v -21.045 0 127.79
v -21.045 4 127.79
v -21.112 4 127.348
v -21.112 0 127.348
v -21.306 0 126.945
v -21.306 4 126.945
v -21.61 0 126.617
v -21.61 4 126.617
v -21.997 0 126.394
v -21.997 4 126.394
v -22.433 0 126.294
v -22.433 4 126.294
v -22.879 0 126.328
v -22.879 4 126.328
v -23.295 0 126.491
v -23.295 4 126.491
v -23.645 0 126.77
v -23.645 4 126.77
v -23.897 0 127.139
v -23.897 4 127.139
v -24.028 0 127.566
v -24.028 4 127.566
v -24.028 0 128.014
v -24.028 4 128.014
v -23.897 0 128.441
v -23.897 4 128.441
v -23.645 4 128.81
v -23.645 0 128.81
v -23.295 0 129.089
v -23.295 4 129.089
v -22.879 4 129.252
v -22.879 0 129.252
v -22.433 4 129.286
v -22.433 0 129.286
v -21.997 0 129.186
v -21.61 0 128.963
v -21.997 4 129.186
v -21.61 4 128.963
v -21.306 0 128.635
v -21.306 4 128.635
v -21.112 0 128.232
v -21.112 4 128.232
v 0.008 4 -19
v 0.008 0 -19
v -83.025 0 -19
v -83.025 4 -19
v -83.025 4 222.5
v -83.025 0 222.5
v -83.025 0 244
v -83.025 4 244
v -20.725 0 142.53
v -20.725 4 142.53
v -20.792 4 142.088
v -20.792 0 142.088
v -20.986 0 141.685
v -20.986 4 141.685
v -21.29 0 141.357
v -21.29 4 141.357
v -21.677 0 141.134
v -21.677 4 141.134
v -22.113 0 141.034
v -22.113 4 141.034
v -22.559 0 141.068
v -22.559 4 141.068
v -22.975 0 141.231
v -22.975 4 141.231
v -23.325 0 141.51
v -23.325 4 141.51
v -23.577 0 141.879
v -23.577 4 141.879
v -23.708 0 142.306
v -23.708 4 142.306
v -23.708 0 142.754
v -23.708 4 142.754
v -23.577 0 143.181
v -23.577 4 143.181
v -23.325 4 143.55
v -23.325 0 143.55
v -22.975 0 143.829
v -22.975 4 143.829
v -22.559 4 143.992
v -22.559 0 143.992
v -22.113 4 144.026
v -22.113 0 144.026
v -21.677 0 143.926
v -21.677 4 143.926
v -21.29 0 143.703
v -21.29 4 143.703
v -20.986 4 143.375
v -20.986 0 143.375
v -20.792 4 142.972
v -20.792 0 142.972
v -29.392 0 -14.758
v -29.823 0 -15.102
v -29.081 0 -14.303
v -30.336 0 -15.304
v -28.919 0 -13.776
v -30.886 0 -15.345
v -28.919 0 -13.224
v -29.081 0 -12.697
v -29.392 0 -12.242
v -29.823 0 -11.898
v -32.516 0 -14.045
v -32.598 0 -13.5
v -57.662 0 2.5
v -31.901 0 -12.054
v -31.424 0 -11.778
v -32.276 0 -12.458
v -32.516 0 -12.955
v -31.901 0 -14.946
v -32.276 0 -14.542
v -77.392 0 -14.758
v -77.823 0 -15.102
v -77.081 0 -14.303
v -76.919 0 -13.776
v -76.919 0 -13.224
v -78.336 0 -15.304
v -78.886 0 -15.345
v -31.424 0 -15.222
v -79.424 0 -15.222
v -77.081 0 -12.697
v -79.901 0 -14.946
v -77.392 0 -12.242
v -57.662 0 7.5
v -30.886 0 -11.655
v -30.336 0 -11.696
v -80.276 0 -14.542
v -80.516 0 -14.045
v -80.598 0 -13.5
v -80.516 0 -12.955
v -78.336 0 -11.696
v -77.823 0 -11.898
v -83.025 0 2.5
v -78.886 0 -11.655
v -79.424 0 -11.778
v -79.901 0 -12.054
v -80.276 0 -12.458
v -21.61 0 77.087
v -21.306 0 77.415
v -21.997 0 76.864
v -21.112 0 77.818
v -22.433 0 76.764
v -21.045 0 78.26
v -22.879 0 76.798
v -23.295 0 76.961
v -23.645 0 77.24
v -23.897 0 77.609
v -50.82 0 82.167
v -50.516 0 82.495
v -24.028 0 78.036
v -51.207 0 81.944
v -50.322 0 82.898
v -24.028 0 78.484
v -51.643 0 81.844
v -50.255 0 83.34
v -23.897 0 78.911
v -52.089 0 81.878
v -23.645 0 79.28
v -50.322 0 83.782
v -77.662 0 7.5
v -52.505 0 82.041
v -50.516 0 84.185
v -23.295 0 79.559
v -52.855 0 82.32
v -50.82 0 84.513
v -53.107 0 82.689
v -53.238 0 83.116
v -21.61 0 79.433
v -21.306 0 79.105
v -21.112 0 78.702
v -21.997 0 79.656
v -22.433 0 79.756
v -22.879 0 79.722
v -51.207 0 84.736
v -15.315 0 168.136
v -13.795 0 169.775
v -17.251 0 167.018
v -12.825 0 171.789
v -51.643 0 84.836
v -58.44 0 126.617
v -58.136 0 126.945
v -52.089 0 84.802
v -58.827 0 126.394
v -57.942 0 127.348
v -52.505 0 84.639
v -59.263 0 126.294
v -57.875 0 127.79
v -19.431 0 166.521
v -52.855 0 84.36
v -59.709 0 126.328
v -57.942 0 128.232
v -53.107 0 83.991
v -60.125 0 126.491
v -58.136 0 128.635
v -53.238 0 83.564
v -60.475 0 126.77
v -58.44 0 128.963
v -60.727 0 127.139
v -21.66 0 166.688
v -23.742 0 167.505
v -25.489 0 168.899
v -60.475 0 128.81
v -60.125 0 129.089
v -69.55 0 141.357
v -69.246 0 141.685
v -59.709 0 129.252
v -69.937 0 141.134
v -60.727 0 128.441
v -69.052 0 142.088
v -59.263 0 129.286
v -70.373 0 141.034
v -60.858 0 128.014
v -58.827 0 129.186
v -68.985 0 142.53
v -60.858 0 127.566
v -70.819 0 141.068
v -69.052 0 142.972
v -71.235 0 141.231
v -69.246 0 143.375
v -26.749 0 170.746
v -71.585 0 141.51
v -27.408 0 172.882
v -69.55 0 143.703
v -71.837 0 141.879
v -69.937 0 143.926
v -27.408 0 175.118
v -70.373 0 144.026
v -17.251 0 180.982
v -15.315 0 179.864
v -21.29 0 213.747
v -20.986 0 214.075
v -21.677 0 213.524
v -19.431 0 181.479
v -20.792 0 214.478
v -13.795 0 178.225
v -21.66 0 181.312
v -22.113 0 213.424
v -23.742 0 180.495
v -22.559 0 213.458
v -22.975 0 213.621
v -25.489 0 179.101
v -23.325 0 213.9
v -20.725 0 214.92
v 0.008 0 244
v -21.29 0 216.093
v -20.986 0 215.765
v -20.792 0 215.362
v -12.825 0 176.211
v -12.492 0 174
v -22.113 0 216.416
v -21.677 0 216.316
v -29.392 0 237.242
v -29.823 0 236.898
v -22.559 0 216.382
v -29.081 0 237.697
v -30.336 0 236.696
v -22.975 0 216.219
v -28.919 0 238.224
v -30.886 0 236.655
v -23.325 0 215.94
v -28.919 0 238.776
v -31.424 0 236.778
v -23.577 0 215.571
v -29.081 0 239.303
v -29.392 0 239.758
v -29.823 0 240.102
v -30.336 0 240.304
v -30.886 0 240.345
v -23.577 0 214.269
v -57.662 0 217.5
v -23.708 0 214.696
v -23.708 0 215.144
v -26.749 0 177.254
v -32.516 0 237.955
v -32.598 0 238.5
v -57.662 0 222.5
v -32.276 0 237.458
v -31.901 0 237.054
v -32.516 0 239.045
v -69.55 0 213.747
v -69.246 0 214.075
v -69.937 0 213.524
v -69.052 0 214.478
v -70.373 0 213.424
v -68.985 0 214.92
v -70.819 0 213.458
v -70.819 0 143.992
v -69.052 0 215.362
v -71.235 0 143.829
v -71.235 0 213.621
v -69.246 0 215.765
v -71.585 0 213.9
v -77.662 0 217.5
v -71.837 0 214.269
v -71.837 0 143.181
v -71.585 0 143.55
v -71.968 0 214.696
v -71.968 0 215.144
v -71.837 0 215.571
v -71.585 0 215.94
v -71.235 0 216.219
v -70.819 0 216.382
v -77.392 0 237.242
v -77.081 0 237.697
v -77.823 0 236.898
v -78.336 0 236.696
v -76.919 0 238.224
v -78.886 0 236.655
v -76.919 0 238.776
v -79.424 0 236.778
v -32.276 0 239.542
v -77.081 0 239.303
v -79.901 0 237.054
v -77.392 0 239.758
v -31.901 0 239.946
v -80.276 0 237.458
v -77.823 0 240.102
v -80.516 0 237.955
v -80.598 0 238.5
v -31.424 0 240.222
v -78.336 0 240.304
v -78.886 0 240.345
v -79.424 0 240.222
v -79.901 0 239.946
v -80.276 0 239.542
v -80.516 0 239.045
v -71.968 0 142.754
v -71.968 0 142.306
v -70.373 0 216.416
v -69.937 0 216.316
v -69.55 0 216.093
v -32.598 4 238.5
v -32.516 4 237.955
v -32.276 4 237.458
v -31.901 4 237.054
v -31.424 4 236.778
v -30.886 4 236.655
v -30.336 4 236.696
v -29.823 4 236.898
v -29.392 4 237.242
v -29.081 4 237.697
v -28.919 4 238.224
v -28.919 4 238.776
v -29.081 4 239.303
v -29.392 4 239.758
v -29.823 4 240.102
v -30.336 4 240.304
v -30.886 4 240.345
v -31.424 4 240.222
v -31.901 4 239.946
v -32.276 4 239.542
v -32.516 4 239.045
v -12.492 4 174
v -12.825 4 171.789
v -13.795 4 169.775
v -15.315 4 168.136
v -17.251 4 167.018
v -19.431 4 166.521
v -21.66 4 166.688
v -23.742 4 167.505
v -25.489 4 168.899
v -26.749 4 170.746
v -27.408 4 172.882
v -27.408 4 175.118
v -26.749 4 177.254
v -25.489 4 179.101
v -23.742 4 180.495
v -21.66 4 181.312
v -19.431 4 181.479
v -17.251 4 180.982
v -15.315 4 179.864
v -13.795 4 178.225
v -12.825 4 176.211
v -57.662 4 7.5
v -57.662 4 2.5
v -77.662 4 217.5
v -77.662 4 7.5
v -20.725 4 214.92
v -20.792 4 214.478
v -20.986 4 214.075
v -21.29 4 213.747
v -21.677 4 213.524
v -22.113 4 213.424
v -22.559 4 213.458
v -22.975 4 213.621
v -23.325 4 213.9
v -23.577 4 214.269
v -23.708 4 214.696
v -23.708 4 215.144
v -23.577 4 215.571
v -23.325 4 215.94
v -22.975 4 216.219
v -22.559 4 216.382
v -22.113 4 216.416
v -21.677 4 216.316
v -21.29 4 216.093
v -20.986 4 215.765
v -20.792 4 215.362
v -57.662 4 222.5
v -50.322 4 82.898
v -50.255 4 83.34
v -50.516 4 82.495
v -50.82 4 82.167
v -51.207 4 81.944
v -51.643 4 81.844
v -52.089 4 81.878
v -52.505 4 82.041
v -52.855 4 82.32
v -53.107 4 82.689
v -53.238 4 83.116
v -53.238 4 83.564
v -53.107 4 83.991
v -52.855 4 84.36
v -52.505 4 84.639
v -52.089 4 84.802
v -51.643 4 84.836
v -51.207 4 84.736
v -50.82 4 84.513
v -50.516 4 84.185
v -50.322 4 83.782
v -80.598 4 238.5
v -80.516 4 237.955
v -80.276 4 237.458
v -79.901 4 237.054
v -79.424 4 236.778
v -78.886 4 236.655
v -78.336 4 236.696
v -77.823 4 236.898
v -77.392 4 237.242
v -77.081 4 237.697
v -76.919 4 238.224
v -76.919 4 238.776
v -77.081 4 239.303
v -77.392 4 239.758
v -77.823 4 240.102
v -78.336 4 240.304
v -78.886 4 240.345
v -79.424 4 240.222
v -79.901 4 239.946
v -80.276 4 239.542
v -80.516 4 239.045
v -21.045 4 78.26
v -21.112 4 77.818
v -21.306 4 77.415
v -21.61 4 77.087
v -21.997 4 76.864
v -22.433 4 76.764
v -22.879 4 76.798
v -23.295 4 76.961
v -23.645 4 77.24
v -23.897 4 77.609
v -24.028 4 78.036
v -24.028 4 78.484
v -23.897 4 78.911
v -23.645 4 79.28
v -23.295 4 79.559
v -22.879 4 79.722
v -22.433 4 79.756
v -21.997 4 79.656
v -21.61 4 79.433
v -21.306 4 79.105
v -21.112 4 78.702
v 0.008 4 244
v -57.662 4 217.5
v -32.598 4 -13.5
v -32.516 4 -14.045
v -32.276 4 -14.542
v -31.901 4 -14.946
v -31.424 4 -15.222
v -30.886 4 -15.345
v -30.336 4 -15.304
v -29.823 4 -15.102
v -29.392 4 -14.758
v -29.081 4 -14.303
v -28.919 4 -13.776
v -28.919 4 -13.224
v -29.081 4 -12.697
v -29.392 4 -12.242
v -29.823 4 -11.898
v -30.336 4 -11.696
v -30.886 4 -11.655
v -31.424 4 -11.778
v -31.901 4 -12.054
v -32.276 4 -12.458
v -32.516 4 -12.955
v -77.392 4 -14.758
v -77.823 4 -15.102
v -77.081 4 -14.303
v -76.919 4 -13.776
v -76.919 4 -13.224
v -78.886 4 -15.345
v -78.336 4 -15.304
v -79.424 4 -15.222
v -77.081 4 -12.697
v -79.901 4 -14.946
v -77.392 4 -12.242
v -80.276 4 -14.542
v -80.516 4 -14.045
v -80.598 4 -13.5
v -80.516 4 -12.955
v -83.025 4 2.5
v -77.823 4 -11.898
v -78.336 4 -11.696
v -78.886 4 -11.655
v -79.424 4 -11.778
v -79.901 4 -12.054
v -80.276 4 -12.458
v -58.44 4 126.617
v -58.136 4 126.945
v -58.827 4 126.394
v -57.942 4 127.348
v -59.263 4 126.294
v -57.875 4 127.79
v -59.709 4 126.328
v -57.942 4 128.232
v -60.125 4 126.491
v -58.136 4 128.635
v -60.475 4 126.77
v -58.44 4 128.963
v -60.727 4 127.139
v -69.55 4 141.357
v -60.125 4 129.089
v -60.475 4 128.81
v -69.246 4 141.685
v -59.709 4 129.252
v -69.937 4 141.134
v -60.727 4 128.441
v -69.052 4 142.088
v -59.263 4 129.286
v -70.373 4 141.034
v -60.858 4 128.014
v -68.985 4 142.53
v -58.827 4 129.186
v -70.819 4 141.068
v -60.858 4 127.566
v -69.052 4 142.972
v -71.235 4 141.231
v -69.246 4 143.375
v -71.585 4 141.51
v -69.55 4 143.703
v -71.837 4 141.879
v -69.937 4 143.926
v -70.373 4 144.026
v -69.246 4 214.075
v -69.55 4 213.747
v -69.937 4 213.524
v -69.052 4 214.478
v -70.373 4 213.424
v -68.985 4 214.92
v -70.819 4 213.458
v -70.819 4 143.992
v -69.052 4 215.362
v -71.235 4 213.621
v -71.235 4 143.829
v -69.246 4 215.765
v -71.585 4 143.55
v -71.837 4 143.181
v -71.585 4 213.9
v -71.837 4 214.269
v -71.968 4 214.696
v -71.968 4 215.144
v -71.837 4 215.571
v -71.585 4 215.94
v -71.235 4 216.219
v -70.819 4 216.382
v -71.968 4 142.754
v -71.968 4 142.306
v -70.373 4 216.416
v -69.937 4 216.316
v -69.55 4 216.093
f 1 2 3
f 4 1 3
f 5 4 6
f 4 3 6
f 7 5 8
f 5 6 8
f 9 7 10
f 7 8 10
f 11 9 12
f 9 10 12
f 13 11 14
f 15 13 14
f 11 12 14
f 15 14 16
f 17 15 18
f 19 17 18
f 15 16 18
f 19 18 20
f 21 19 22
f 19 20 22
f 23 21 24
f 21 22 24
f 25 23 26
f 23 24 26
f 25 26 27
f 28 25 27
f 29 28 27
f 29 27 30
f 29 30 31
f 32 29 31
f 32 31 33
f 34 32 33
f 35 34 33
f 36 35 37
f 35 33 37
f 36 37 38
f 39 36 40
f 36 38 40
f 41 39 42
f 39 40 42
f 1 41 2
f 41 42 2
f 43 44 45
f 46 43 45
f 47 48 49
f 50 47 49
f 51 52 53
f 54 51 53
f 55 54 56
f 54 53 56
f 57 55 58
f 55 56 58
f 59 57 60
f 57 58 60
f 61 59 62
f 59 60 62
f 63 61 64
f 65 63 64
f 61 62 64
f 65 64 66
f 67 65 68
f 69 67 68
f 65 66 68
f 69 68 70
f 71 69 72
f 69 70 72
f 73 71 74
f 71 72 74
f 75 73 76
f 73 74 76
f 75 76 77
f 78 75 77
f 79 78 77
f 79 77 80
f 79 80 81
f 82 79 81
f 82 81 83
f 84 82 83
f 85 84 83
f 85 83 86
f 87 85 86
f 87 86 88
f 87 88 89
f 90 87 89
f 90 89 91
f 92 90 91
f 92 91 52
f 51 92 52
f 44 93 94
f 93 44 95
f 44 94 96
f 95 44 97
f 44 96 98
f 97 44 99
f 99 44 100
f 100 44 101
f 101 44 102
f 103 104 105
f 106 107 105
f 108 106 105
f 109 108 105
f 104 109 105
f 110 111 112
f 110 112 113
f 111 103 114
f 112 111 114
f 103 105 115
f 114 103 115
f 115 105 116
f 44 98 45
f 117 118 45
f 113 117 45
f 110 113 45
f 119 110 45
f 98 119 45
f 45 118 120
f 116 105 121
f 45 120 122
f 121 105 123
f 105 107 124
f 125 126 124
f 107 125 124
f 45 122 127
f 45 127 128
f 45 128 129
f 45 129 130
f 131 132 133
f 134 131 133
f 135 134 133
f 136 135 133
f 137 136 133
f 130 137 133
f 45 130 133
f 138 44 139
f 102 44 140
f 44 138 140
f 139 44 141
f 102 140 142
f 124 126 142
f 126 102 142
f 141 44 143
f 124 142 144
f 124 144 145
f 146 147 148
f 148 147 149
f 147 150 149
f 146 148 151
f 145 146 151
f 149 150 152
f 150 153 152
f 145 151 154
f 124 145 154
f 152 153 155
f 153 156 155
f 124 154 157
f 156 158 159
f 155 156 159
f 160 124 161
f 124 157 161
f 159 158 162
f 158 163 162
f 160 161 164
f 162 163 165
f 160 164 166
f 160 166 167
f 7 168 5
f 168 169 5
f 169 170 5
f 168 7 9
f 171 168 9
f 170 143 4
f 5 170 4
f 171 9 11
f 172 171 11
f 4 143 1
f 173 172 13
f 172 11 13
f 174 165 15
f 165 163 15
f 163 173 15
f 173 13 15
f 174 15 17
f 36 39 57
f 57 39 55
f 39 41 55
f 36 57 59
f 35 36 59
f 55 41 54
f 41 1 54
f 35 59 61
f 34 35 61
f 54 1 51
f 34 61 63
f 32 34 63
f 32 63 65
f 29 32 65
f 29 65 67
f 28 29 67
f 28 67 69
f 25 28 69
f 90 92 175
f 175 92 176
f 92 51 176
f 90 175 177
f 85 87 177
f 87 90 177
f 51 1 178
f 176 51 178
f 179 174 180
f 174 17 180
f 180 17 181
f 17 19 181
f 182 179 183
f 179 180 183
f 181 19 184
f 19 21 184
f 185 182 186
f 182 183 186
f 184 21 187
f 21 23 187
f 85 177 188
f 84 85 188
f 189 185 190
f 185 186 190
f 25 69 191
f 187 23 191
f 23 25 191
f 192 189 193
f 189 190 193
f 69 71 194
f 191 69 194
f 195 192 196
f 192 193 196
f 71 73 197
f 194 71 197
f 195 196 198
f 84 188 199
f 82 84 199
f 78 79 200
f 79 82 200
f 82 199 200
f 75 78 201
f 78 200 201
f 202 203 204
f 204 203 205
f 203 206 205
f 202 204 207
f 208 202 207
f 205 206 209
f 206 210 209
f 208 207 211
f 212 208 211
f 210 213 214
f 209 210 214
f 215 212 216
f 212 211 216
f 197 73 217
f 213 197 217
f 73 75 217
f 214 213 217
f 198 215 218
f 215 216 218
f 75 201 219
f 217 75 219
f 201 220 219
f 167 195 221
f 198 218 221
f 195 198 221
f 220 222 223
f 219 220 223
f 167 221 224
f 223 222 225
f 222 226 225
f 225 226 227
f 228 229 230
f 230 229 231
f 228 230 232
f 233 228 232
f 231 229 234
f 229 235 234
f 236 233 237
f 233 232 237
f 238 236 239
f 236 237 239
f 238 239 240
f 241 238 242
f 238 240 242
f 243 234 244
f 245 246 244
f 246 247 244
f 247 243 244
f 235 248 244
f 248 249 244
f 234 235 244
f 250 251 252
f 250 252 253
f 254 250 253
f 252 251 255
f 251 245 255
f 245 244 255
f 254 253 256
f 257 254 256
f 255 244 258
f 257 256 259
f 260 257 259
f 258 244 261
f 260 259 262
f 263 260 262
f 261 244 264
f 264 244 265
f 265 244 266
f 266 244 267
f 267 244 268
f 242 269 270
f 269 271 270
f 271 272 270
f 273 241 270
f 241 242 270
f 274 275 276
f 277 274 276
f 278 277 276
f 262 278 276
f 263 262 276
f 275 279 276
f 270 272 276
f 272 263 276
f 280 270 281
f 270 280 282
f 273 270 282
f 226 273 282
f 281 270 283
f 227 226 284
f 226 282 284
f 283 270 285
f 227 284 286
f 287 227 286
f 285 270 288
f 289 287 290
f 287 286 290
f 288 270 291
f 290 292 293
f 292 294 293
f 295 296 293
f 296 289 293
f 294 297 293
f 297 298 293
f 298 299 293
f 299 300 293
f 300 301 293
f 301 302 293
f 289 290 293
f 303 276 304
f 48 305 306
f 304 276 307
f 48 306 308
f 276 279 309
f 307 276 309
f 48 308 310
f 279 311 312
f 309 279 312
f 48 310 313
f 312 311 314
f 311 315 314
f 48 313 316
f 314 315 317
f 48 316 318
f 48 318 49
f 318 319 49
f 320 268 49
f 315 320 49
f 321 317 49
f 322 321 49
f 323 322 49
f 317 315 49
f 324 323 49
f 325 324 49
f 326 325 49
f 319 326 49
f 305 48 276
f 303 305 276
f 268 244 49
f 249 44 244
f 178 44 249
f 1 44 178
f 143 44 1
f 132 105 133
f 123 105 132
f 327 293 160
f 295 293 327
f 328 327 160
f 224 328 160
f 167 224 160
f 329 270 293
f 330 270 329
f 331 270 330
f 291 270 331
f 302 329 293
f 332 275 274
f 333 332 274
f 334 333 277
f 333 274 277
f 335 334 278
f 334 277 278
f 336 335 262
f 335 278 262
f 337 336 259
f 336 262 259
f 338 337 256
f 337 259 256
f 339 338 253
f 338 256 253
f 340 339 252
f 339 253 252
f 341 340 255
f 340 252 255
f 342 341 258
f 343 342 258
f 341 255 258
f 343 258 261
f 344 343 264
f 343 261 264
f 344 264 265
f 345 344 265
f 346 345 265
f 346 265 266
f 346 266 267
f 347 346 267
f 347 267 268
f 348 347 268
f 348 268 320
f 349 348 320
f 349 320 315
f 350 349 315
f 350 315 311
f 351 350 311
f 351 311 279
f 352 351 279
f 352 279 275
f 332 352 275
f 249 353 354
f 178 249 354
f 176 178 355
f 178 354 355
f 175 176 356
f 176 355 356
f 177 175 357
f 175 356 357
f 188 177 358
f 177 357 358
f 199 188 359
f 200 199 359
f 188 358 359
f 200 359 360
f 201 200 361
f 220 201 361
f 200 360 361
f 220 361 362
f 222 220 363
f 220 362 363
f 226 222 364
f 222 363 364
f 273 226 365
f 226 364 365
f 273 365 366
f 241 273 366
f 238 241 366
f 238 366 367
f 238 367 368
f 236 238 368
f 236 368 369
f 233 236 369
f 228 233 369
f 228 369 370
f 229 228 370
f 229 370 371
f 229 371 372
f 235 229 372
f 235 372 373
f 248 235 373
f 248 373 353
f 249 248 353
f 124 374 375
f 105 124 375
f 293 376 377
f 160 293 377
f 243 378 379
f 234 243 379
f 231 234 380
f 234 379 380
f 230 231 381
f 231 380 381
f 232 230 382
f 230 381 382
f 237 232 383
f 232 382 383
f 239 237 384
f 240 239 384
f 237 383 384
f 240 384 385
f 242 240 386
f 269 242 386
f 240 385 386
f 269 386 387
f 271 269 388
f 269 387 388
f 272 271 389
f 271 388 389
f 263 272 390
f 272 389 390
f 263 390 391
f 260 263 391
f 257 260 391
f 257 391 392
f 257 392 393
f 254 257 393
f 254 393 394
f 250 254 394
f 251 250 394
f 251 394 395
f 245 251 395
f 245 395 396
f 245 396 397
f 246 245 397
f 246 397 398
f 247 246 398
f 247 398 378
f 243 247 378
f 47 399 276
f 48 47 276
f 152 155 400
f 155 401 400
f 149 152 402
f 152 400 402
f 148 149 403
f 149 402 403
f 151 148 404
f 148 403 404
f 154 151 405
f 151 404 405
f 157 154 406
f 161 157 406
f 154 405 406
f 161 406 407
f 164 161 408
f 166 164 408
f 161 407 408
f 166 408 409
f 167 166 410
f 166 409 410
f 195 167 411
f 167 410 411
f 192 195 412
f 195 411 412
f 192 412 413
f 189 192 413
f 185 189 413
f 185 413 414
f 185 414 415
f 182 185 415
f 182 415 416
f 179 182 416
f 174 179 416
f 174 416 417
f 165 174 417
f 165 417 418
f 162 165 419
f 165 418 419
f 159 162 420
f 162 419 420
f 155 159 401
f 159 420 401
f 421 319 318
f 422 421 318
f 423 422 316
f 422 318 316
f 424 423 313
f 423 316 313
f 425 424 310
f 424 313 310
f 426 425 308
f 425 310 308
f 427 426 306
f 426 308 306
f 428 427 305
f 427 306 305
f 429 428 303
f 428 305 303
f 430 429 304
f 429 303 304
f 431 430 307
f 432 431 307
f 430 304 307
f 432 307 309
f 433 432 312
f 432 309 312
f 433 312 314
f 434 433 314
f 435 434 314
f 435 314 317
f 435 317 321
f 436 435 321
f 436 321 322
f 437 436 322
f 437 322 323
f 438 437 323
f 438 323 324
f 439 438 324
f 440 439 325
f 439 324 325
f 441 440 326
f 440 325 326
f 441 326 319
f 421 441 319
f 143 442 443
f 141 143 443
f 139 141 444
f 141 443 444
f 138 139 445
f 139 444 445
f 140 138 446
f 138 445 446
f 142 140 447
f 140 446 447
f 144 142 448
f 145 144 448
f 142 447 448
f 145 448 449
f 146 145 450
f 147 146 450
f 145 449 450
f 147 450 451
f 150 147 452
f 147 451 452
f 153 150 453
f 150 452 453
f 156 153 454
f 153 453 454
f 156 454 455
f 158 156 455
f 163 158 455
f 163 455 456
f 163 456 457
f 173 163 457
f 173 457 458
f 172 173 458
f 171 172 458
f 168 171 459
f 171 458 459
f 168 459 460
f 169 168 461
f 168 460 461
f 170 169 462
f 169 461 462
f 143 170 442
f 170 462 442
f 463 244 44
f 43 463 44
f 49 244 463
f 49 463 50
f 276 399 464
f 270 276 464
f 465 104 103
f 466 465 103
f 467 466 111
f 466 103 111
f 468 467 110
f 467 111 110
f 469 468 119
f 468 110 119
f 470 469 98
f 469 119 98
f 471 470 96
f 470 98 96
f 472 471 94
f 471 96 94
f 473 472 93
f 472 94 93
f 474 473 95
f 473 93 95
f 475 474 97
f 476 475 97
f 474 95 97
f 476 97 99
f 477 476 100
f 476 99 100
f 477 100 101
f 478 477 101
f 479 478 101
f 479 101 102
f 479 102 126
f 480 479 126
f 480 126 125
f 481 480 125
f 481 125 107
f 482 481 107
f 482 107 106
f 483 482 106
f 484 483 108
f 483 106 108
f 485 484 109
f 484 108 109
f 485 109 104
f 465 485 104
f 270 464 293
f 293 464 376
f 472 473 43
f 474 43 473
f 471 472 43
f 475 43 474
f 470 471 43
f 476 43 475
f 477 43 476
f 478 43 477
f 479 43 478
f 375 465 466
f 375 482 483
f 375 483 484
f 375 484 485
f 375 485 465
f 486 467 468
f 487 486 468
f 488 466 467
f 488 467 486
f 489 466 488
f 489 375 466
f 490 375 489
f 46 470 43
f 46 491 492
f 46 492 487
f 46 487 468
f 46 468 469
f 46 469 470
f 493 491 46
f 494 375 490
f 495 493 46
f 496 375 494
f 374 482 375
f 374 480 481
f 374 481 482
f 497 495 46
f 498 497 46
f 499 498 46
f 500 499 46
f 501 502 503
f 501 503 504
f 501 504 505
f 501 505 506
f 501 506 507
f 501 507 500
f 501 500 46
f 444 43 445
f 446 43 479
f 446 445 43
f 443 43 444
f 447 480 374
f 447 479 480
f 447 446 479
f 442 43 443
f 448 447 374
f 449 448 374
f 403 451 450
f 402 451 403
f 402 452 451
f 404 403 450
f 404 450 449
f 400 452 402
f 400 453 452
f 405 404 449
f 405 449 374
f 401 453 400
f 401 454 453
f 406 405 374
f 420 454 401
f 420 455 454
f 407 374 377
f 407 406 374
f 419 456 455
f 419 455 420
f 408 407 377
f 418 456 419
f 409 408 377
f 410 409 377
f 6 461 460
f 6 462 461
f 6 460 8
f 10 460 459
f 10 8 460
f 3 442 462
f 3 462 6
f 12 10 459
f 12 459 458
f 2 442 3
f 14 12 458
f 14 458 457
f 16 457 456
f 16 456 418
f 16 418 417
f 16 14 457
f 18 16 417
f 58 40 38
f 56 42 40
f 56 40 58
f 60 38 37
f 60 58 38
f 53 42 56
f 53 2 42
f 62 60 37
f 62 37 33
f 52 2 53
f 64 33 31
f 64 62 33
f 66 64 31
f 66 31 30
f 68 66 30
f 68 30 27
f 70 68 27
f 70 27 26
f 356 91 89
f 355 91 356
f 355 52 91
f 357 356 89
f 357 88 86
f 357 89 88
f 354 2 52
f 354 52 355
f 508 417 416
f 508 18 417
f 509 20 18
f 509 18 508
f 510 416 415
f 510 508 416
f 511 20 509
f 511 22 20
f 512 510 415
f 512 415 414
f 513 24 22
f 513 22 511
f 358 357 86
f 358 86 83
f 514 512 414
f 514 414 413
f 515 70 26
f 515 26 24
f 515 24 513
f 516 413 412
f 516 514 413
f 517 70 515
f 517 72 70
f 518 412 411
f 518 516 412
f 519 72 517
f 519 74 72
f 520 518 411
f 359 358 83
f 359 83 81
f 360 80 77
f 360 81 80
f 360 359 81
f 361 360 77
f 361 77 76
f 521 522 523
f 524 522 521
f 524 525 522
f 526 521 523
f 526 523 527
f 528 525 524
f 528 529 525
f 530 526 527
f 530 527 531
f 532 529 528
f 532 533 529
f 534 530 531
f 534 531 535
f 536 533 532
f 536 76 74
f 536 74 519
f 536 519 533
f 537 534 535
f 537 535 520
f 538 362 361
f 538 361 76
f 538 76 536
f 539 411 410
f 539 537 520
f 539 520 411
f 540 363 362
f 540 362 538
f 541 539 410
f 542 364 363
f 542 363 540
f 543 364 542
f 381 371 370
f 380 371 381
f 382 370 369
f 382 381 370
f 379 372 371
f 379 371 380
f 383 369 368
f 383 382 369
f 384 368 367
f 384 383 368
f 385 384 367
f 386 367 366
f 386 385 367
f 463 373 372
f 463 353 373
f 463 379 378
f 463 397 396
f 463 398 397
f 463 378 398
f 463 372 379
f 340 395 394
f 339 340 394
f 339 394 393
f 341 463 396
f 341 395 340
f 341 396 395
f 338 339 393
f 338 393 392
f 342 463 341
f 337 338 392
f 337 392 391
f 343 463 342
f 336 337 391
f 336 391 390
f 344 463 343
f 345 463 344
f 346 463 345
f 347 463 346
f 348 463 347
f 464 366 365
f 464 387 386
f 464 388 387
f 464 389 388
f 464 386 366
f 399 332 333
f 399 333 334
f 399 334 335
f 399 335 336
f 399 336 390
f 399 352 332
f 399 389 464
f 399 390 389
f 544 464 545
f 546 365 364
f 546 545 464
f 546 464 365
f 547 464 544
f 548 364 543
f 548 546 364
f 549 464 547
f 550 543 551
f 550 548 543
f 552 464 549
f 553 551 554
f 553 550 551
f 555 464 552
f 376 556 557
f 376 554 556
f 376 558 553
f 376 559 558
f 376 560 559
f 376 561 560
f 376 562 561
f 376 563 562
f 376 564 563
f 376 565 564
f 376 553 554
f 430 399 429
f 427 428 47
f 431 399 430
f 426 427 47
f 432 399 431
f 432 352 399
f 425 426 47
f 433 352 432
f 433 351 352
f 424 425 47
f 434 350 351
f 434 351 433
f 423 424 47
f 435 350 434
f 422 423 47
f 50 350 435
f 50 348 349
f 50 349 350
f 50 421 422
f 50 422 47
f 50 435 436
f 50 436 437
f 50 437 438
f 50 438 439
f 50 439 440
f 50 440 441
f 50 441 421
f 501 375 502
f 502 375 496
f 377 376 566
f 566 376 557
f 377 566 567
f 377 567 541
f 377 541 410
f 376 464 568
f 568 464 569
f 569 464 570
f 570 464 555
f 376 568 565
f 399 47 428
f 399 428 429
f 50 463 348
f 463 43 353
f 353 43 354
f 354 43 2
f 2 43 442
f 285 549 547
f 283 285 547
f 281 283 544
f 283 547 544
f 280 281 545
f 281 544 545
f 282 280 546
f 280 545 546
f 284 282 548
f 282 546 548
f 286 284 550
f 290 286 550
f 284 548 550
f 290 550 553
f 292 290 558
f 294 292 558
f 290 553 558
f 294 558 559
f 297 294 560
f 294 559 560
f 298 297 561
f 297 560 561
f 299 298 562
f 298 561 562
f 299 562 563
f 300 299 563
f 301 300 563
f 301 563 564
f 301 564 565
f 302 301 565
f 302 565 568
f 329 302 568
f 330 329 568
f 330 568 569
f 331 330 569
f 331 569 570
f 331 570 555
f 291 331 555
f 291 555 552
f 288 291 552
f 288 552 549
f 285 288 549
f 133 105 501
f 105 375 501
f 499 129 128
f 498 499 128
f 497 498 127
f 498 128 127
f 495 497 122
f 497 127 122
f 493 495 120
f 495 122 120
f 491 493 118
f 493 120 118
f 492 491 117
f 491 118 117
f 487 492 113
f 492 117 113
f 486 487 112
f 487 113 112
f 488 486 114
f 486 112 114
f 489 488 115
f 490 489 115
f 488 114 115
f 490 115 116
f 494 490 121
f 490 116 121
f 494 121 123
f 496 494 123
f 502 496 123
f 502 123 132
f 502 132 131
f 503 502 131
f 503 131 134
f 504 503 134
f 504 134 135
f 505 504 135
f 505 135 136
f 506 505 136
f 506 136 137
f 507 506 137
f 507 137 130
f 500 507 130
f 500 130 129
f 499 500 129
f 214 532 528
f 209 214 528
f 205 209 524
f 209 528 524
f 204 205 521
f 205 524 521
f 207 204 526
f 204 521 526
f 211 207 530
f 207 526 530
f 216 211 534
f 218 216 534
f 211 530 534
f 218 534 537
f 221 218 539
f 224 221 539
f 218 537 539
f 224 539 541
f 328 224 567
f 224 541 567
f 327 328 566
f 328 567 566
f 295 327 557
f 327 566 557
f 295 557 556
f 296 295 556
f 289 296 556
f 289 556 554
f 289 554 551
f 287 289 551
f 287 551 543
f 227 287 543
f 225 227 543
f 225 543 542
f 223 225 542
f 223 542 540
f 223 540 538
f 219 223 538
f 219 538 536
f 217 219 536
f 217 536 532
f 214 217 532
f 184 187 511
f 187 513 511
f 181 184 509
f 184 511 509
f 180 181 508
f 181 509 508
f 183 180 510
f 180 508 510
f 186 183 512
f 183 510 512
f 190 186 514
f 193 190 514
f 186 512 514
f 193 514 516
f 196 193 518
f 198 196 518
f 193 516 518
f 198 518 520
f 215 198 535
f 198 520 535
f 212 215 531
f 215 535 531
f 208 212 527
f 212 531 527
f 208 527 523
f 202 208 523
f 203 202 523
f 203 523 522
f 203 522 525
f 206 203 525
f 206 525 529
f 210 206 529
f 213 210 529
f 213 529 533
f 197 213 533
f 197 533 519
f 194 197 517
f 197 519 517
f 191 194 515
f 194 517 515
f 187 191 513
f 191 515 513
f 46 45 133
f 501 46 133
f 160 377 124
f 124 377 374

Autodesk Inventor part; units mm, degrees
ref_plane "YZ Plane" through (0, 0, 0) normal (1, 0, 0) x (0, 1, 0)
ref_plane "XZ Plane" through (0, 0, 0) normal (0, 1, 0) x (-1, 0, 0)
ref_plane "XY Plane" through (0, 0, 0) normal (0, 0, 1) x (1, 0, 0)
sketch "Эскиз1" plane through (0, 0, 0) normal (0, 1, 0) x (-1, 0, 0)
  line L0 (-2.6795, -19) -> (83.0251, -19)
  line L1 (-2.6795, 244) -> (83.0251, 244)
  circle A0 centre (30.7479, 238.5) radius 1.85
  circle A1 centre (78.7479, 238.5) radius 1.85
  circle A2 centre (78.7479, -13.5) radius 1.85
  circle A3 centre (30.7479, -13.5) radius 1.85
  line L2 (83.0251, 244) -> (-2.6795, 244)
  line L3 (-2.6795, 244) -> (-2.6795, -19)
  line L4 (-2.6795, -19) -> (83.0251, -19)
  line L5 (83.0251, -19) -> (83.0251, 244)
  point P0 (0, 0)
  point P1 (83.0251, -19)
  point P2 (-2.6795, 244)
  dimension "d7" = 5.5
  dimension "d8" = 5.5
  dimension "d9" = 4.2772
  dimension "d10" = 48
  dimension "d11" = 263
  dimension "d12" = 5.5
  dimension "d13" = 5.5
  dimension "d14" = 4.2772
  dimension "d15" = 48
extrude "Выдавливание1" add sketch "Эскиз1" along normal blind 4
thicken "Толщина1" operation add thickness 2.671 both sides no extend neighbours yes toward (-1, 0, 0) faces at (2.6795, 1.3333, 156.3333)
sketch "Эскиз2" plane through (-1.399, 4, 60) normal (0, 1, 0) x (1, 0, 0)
  line L0 (-76.2625, -157.5) -> (-76.2625, 52.5)
  line L1 (-76.2625, 52.5) -> (-56.2625, 52.5)
  line L2 (-56.2625, -157.5) -> (-76.2625, -157.5)
  line L3 (-56.2625, 57.5) -> (-76.2625, 57.5)
  line L4 (-76.2625, 57.5) -> (-81.2625, 57.5)
  line L5 (-81.2625, 57.5) -> (-81.2625, -162.5)
  line L6 (-81.2625, -162.5) -> (-76.2625, -162.5)
  line L7 (-76.2625, -162.5) -> (-56.2625, -162.5)
  line L8 (-56.2625, -162.5) -> (-56.2625, -157.5)
  line L9 (-56.2625, 52.5) -> (-56.2625, 57.5)
  line L10 (1.4075, -184) -> (1.4075, 79) projected
  point P0 (0, 0)
  dimension "d21" = 57.67
  dimension "d22" = 25
  dimension "d23" = 5
extrude "Выдавливание2" cut sketch "Эскиз2" against normal blind 10
thicken "Толщина2" operation add thickness 2 both sides no extend neighbours yes toward (-1, 0, 0) faces at (-82.6615, 2.6667, 75.8333)
sketch "Эскиз3" plane through (0, 4, 0) normal (0, 1, 0) x (1, 0, 0)
  circle A0 centre (-51.7551, -83.34) radius 1.5 projected
  circle A1 centre (-22.5451, -78.26) radius 1.5 projected
  circle A2 centre (-22.5451, -127.79) radius 1.5 projected
  circle A3 centre (-59.3751, -127.79) radius 1.5 projected
  circle A4 centre (-22.2251, -142.53) radius 1.5 projected
  circle A5 centre (-70.4851, -142.53) radius 1.5 projected
  circle A6 centre (-22.2251, -214.92) radius 1.5 projected
  circle A7 centre (-70.4851, -214.92) radius 1.5 projected
  point P0 (0, 0)
extrude "Выдавливание3" cut sketch "Эскиз3" against normal blind 10
sketch "Эскиз4" plane through (0, 4, 0) normal (0, 1, 0) x (1, 0, 0)
  circle A0 centre (-19.9915, -174) radius 7.5
  line L0 (-83.0251, -244) -> (0.0085, -244) projected
  line L1 (0.0085, -244) -> (0.0085, 19) projected
  point P0 (0, 0)
  dimension "d26" = 15
  dimension "d27" = 70
  dimension "d28" = 20
extrude "Выдавливание4" cut sketch "Эскиз4" against normal blind 10
sketch "Эскиз5" plane through (0, 4, 0) normal (0, 1, 0) x (1, 0, 0)
  line L0 (-57.6615, -7.5) -> (-77.6615, -7.5) projected
  line L1 (-83.0251, -2.5) -> (-57.6615, -2.5) projected
  point P0 (0, 0)
  dimension "d31" = 5
properties part number "KB33-046-004-002 - Передняя пластина" material "Дерево (вишня)"
